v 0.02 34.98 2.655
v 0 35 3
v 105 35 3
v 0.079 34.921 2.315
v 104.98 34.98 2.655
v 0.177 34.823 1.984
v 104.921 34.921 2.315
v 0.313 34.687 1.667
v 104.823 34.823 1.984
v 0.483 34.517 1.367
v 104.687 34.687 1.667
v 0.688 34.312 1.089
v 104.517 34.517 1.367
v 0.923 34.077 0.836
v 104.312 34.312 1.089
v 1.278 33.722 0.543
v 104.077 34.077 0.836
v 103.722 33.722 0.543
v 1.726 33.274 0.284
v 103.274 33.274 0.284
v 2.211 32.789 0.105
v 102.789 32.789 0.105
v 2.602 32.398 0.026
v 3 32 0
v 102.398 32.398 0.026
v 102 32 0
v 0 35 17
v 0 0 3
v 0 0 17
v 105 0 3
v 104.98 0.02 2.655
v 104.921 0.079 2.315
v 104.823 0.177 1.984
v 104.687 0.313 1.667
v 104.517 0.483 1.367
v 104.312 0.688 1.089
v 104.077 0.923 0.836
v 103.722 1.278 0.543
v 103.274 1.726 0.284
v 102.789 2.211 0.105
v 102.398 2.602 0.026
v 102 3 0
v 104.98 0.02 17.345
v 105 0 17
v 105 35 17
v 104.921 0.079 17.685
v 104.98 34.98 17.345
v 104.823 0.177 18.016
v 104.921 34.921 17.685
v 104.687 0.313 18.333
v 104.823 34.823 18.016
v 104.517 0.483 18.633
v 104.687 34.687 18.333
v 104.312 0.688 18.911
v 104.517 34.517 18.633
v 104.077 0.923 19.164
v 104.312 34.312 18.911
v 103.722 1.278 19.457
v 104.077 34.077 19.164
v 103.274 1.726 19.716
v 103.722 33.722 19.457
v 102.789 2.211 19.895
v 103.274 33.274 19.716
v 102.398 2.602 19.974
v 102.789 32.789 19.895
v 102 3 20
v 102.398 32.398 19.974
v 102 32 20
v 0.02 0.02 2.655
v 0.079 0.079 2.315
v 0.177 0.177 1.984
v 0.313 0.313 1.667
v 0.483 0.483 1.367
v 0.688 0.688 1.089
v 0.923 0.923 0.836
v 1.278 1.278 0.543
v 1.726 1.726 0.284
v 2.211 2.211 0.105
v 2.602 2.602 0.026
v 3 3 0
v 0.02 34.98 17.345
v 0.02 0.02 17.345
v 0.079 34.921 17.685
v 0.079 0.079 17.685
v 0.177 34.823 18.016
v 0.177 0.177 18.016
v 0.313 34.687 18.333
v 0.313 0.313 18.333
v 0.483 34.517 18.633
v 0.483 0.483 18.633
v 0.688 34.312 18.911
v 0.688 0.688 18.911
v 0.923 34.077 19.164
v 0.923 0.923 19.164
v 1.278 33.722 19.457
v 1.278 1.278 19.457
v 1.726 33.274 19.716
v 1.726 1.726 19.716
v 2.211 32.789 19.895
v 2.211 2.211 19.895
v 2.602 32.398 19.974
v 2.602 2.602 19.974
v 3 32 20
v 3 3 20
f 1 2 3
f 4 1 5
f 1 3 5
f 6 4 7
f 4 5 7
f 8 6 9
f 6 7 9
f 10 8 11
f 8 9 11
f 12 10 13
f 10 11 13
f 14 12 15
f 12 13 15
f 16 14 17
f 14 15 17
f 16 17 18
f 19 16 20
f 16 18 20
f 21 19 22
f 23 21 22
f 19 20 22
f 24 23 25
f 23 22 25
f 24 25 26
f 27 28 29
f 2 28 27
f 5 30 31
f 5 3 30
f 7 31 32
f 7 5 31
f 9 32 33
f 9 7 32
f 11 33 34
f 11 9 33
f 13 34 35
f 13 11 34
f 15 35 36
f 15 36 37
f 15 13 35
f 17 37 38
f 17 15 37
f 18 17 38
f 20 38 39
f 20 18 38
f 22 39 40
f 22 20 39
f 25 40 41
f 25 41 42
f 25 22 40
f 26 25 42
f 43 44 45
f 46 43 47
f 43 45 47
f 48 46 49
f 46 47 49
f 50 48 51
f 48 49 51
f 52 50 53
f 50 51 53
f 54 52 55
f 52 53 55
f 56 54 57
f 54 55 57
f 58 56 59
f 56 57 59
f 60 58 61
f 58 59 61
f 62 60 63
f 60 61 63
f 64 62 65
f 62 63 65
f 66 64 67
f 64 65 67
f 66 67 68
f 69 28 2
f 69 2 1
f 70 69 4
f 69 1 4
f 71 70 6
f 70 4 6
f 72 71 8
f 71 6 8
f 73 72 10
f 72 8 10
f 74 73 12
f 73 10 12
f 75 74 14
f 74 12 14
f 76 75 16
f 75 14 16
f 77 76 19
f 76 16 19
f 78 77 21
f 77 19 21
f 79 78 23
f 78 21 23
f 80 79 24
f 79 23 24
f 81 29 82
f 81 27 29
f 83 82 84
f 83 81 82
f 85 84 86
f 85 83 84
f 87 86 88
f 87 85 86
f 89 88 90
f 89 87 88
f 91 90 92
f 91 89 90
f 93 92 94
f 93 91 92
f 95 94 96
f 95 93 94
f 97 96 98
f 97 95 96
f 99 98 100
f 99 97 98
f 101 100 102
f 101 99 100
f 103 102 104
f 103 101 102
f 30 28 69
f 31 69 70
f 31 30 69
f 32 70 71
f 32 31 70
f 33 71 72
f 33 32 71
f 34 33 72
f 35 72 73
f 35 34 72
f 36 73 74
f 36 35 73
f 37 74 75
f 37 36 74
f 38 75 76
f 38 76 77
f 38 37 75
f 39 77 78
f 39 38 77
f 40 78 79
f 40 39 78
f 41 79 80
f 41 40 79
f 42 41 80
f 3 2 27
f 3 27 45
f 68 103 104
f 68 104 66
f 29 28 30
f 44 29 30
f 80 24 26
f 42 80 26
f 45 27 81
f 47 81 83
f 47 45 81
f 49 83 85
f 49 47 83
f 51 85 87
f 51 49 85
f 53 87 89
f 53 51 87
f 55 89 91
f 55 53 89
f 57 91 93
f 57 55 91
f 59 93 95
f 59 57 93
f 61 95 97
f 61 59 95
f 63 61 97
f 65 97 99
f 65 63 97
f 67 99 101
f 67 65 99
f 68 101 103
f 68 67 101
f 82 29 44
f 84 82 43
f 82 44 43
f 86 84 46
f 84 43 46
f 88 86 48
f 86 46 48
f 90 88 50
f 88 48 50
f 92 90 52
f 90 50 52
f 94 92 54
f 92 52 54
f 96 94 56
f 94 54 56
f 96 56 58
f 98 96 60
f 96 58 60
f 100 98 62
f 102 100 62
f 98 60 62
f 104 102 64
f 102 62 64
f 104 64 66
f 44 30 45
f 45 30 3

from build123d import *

# Parameters (mm, degrees)
SKETCH_W  = 105
SKETCH_H  = 35
PAD_DEPTH = 20
FILLET_R  = 3


with BuildPart() as part:
    # Sketch → Pad (new body)
    with BuildSketch(Plane.XY):
        with Locations((52.5, 17.5)):
            Rectangle(SKETCH_W, SKETCH_H)
    extrude(amount=PAD_DEPTH)

    # Fillet
    fillet_edges = [part.edges().sort_by_distance(p)[0] for p in [
        (0, 17.5, 20),
        (52.5, 35, 20),
        (52.5, 0, 20),
        (105, 17.5, 20),
        (0, 17.5, 0),
        (52.5, 0, 0),
        (52.5, 35, 0),
        (105, 17.5, 0),
    ]]
    fillet(fillet_edges, radius=FILLET_R)


solid = part.part
